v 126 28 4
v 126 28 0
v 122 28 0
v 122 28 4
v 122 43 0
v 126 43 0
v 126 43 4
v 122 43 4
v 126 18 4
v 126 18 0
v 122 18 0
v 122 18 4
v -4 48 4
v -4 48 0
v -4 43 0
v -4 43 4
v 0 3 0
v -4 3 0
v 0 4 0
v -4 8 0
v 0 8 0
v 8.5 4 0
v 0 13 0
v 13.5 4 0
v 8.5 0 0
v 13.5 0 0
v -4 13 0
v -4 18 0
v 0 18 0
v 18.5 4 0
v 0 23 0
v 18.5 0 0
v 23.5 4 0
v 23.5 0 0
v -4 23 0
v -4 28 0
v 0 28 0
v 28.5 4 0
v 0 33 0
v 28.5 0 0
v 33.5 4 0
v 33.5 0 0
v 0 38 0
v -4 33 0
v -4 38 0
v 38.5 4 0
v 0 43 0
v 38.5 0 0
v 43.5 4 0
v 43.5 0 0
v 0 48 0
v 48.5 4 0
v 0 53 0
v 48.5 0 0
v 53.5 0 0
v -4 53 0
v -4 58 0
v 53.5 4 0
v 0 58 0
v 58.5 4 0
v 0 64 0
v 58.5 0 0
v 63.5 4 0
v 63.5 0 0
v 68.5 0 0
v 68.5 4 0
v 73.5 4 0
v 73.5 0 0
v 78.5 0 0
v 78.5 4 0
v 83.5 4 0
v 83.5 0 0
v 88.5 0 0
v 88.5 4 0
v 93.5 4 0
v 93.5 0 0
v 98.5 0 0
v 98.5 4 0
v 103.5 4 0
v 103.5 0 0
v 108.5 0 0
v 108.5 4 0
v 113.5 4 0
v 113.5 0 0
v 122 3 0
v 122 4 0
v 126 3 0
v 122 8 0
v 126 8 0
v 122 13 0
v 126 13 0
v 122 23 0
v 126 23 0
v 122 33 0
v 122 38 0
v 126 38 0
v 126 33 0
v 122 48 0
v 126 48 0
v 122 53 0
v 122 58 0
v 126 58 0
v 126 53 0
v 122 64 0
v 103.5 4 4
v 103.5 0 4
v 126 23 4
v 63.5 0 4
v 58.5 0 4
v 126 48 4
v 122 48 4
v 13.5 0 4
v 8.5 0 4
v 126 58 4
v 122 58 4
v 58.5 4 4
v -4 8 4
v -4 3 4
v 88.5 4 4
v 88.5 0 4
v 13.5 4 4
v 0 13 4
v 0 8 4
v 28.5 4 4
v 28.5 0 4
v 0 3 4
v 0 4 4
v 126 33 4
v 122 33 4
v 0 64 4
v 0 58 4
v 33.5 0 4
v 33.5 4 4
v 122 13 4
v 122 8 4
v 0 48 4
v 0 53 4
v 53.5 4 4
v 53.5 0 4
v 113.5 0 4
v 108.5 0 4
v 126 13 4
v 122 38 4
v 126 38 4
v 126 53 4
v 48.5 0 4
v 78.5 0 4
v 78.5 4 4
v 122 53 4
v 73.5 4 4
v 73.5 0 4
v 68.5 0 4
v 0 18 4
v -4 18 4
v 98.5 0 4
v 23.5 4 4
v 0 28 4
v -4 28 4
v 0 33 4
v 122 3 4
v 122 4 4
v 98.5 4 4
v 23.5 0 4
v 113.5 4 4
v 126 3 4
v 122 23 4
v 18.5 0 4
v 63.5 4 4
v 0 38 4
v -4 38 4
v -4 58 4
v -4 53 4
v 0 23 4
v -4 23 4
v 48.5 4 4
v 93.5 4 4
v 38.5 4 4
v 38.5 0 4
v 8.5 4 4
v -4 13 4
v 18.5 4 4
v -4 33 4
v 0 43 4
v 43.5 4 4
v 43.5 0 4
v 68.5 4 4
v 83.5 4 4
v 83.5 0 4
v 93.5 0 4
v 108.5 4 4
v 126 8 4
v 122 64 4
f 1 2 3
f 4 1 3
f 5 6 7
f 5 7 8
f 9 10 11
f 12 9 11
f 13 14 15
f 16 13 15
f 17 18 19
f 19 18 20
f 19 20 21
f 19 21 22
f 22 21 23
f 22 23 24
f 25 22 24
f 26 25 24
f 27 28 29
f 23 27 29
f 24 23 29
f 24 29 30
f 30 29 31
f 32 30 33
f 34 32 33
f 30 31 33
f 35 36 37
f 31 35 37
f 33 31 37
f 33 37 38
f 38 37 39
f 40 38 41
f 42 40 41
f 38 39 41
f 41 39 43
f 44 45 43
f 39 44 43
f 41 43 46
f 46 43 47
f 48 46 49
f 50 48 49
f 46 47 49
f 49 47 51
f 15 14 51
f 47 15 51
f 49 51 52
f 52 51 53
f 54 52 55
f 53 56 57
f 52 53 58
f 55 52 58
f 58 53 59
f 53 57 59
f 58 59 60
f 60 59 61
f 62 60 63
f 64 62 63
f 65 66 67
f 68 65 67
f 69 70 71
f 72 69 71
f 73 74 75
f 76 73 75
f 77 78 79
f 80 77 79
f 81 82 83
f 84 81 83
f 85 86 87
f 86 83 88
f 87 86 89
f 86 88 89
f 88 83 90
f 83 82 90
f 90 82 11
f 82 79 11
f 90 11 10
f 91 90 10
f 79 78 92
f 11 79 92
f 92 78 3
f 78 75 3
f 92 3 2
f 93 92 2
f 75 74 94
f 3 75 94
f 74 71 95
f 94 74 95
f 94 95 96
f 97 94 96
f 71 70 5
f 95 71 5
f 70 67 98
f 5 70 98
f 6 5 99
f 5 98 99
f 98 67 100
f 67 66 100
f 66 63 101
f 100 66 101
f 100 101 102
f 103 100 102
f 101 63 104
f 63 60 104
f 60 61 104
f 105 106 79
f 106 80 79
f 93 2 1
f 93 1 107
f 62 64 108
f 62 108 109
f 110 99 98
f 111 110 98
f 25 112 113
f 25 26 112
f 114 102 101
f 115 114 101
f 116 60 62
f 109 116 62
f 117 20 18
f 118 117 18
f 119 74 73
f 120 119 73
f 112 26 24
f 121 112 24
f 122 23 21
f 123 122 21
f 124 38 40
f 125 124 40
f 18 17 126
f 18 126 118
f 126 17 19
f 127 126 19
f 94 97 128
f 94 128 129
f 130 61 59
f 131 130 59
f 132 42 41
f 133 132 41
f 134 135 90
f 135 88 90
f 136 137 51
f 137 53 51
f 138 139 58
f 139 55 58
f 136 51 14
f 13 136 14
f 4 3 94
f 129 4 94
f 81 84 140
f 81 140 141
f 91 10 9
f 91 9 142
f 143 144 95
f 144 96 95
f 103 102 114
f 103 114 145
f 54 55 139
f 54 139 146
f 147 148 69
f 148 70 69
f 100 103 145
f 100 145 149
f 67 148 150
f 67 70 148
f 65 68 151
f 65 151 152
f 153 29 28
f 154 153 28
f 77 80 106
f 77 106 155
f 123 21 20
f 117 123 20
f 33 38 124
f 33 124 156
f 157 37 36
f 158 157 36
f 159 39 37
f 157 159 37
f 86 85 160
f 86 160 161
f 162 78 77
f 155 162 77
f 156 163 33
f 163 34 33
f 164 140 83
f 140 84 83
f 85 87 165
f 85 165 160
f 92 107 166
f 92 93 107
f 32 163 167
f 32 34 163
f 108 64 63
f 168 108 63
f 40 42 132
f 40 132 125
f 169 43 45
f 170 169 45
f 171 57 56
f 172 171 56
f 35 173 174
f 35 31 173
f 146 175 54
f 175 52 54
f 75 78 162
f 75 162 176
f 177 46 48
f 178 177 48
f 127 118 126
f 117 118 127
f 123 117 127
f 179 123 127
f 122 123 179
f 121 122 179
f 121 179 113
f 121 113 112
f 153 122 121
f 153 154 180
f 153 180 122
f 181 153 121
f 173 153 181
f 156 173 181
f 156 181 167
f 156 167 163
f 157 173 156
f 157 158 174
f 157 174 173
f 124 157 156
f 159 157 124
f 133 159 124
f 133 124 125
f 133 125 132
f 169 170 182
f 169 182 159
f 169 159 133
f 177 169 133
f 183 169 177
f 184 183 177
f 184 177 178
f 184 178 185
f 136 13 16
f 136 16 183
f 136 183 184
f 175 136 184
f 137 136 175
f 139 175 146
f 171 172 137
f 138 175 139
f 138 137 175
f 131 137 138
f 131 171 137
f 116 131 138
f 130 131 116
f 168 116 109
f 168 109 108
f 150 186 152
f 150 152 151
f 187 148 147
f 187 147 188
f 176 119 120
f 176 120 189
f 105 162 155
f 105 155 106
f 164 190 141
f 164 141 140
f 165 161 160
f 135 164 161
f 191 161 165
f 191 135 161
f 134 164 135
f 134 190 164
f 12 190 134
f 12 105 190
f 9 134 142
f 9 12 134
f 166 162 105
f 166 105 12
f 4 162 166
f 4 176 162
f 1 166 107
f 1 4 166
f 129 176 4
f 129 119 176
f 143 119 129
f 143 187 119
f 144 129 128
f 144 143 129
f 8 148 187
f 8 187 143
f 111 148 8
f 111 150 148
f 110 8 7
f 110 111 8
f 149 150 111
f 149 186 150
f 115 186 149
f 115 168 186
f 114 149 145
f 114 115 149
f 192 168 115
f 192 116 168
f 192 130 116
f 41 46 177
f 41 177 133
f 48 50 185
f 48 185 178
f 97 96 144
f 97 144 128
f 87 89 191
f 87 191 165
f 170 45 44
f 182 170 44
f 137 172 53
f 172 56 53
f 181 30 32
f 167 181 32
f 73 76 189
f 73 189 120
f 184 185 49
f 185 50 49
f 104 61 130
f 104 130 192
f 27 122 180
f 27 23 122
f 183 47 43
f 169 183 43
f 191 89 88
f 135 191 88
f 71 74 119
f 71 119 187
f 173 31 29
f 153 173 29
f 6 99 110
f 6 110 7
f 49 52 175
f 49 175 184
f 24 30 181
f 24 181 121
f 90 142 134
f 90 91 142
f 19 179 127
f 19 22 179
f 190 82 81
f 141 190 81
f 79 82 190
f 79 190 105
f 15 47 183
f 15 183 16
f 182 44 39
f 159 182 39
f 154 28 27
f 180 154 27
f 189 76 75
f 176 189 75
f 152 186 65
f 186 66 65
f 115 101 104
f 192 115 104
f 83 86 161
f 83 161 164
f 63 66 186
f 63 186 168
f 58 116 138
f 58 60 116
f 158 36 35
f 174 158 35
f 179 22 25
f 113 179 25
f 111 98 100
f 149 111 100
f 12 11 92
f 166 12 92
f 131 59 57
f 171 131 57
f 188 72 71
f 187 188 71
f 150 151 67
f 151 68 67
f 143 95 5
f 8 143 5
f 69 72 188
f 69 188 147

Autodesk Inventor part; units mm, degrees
ref_plane "YZ Plane" through (0, 0, 0) normal (1, 0, 0) x (0, 1, 0)
ref_plane "XZ Plane" through (0, 0, 0) normal (0, 1, 0) x (-1, 0, 0)
ref_plane "XY Plane" through (0, 0, 0) normal (0, 0, 1) x (1, 0, 0)
sketch "Sketch1" plane through (0, 0, 0) normal (0, 0, 1) x (1, 0, 0)
  line L0 (0, 3) -> (-4, 3)
  line L1 (0, 0) -> (0, 4)
  line L2 (8.5, 4) -> (0, 4)
  line L3 (8.5, 4) -> (8.5, 0)
  line L4 (13.5, 0) -> (8.5, 0)
  line L5 (13.5, 0) -> (13.5, 4)
  line L6 (18.5, 4) -> (13.5, 4)
  line L7 (18.5, 4) -> (18.5, 0)
  line L8 (23.5, 0) -> (18.5, 0)
  line L9 (23.5, 0) -> (23.5, 4)
  line L10 (28.5, 4) -> (23.5, 4)
  line L11 (28.5, 4) -> (28.5, 0)
  line L12 (33.5, 0) -> (28.5, 0)
  line L13 (33.5, 0) -> (33.5, 4)
  line L14 (38.5, 4) -> (33.5, 4)
  line L15 (38.5, 4) -> (38.5, 0)
  line L16 (43.5, 0) -> (38.5, 0)
  line L17 (43.5, 0) -> (43.5, 4)
  line L18 (48.5, 4) -> (43.5, 4)
  line L19 (48.5, 4) -> (48.5, 0)
  line L20 (53.5, 0) -> (48.5, 0)
  line L21 (53.5, 0) -> (53.5, 4)
  line L22 (58.5, 4) -> (53.5, 4)
  line L23 (58.5, 4) -> (58.5, 0)
  line L24 (63.5, 0) -> (58.5, 0)
  line L25 (63.5, 0) -> (63.5, 4)
  line L26 (68.5, 4) -> (63.5, 4)
  line L27 (68.5, 4) -> (68.5, 0)
  line L28 (73.5, 0) -> (68.5, 0)
  line L29 (73.5, 0) -> (73.5, 4)
  line L30 (78.5, 4) -> (73.5, 4)
  line L31 (83.5, 0) -> (78.5, 0)
  line L32 (78.5, 4) -> (78.5, 0)
  line L33 (83.5, 0) -> (83.5, 4)
  line L34 (88.5, 4) -> (83.5, 4)
  line L35 (88.5, 4) -> (88.5, 0)
  line L36 (93.5, 0) -> (88.5, 0)
  line L37 (93.5, 0) -> (93.5, 4)
  line L38 (98.5, 4) -> (93.5, 4)
  line L39 (98.5, 4) -> (98.5, 0)
  line L40 (103.5, 0) -> (98.5, 0)
  line L41 (103.5, 0) -> (103.5, 4)
  line L42 (108.5, 4) -> (103.5, 4)
  line L43 (108.5, 4) -> (108.5, 0)
  line L44 (113.5, 0) -> (108.5, 0)
  line L45 (113.5, 0) -> (113.5, 4)
  line L46 (122, 4) -> (113.5, 4)
  line L47 (126, 3) -> (122, 3)
  line L48 (122, 0) -> (122, 4)
  line L49 (126, 8) -> (126, 3)
  line L50 (126, 8) -> (122, 8)
  line L51 (122, 8) -> (122, 13)
  line L52 (126, 13) -> (122, 13)
  line L53 (126, 18) -> (126, 13)
  line L54 (126, 18) -> (122, 18)
  line L55 (122, 18) -> (122, 23)
  line L56 (126, 23) -> (122, 23)
  line L57 (126, 28) -> (126, 23)
  line L58 (126, 28) -> (122, 28)
  line L59 (122, 28) -> (122, 33)
  line L60 (126, 33) -> (122, 33)
  line L61 (126, 38) -> (126, 33)
  line L62 (126, 38) -> (122, 38)
  line L63 (122, 38) -> (122, 43)
  line L64 (126, 43) -> (122, 43)
  line L65 (126, 48) -> (126, 43)
  line L66 (126, 48) -> (122, 48)
  line L67 (122, 48) -> (122, 53)
  line L68 (126, 53) -> (122, 53)
  line L69 (126, 58) -> (126, 53)
  line L70 (126, 58) -> (122, 58)
  line L71 (122, 58) -> (122, 68)
  line L72 (-4, 8) -> (-4, 3)
  line L73 (0, 8) -> (-4, 8)
  line L74 (0, 13) -> (0, 8)
  line L75 (0, 13) -> (-4, 13)
  line L76 (-4, 18) -> (-4, 13)
  line L77 (0, 18) -> (-4, 18)
  line L78 (0, 23) -> (0, 18)
  line L79 (0, 23) -> (-4, 23)
  line L80 (-4, 28) -> (-4, 23)
  line L81 (0, 28) -> (-4, 28)
  line L82 (0, 33) -> (0, 28)
  line L83 (-4, 33) -> (0, 33)
  line L84 (-4, 38) -> (-4, 33)
  line L85 (0, 38) -> (-4, 38)
  line L86 (0, 43) -> (0, 38)
  line L87 (0, 43) -> (-4, 43)
  line L88 (-4, 48) -> (-4, 43)
  line L89 (0, 48) -> (-4, 48)
  line L90 (0, 53) -> (0, 48)
  line L91 (-4, 53) -> (0, 53)
  line L92 (-4, 58) -> (-4, 53)
  line L93 (0, 58) -> (-4, 58)
  line L94 (0, 68) -> (0, 58)
  line L95 (0, 64) -> (122, 64)
  point P0 (0, 0)
extrude "Extrusion1" add sketch "Sketch1" along normal blind 4
sketch "Sketch2" plane through (0, 0, 0) normal (0, 0, -1) x (-1, 0, 0)
  line L0 (-8.5, 4) -> (-8.5, 0) projected
  line L1 (0, 4) -> (-8.5, 4) projected
  line L2 (0, 3) -> (0, 4) projected
  line L3 (4, 3) -> (0, 3) projected
  line L4 (4, 8) -> (4, 3) projected
  line L5 (0, 8) -> (4, 8) projected
  line L6 (0, 13) -> (0, 8) projected
  line L7 (4, 13) -> (0, 13) projected
  line L8 (4, 18) -> (4, 13) projected
  line L9 (0, 18) -> (4, 18) projected
  line L10 (0, 23) -> (0, 18) projected
  line L11 (4, 23) -> (0, 23) projected
  line L12 (4, 28) -> (4, 23) projected
  line L13 (0, 28) -> (4, 28) projected
  line L14 (0, 33) -> (0, 28) projected
  line L15 (4, 33) -> (0, 33) projected
  line L16 (4, 38) -> (4, 33) projected
  line L17 (0, 38) -> (4, 38) projected
  line L18 (0, 43) -> (0, 38) projected
  line L19 (4, 43) -> (0, 43) projected
  line L20 (4, 48) -> (4, 43) projected
  line L21 (0, 48) -> (4, 48) projected
  line L22 (0, 53) -> (0, 48) projected
  line L23 (4, 53) -> (0, 53) projected
  line L24 (4, 58) -> (4, 53) projected
  line L25 (0, 58) -> (4, 58) projected
  line L26 (0, 64) -> (0, 58) projected
  line L27 (-122, 64) -> (0, 64) projected
  line L28 (-122, 58) -> (-122, 64) projected
  line L29 (-126, 58) -> (-122, 58) projected
  line L30 (-126, 53) -> (-126, 58) projected
  line L31 (-122, 53) -> (-126, 53) projected
  line L32 (-122, 48) -> (-122, 53) projected
  line L33 (-126, 48) -> (-122, 48) projected
  line L34 (-126, 43) -> (-126, 48) projected
  line L35 (-122, 43) -> (-126, 43) projected
  line L36 (-122, 38) -> (-122, 43) projected
  line L37 (-126, 38) -> (-122, 38) projected
  line L38 (-126, 33) -> (-126, 38) projected
  line L39 (-122, 33) -> (-126, 33) projected
  line L40 (-122, 28) -> (-122, 33) projected
  line L41 (-126, 28) -> (-122, 28) projected
  line L42 (-126, 23) -> (-126, 28) projected
  line L43 (-122, 23) -> (-126, 23) projected
  line L44 (-122, 18) -> (-122, 23) projected
  line L45 (-126, 18) -> (-122, 18) projected
  line L46 (-126, 13) -> (-126, 18) projected
  line L47 (-122, 13) -> (-126, 13) projected
  line L48 (-122, 8) -> (-122, 13) projected
  line L49 (-126, 8) -> (-122, 8) projected
  line L50 (-126, 3) -> (-126, 8) projected
  line L51 (-122, 3) -> (-126, 3) projected
  line L52 (-122, 4) -> (-122, 3) projected
  line L53 (-113.5, 4) -> (-122, 4) projected
  line L54 (-113.5, 0) -> (-113.5, 4) projected
  line L55 (-108.5, 0) -> (-113.5, 0) projected
  line L56 (-108.5, 4) -> (-108.5, 0) projected
  line L57 (-103.5, 4) -> (-108.5, 4) projected
  line L58 (-103.5, 0) -> (-103.5, 4) projected
  line L59 (-98.5, 0) -> (-103.5, 0) projected
  line L60 (-98.5, 4) -> (-98.5, 0) projected
  line L61 (-93.5, 4) -> (-98.5, 4) projected
  line L62 (-93.5, 0) -> (-93.5, 4) projected
  line L63 (-88.5, 0) -> (-93.5, 0) projected
  line L64 (-88.5, 4) -> (-88.5, 0) projected
  line L65 (-83.5, 4) -> (-88.5, 4) projected
  line L66 (-83.5, 0) -> (-83.5, 4) projected
  line L67 (-78.5, 0) -> (-83.5, 0) projected
  line L68 (-78.5, 4) -> (-78.5, 0) projected
  line L69 (-73.5, 4) -> (-78.5, 4) projected
  line L70 (-73.5, 0) -> (-73.5, 4) projected
  line L71 (-68.5, 0) -> (-73.5, 0) projected
  line L72 (-68.5, 4) -> (-68.5, 0) projected
  line L73 (-63.5, 4) -> (-68.5, 4) projected
  line L74 (-63.5, 0) -> (-63.5, 4) projected
  line L75 (-58.5, 0) -> (-63.5, 0) projected
  line L76 (-58.5, 4) -> (-58.5, 0) projected
  line L77 (-53.5, 4) -> (-58.5, 4) projected
  line L78 (-53.5, 0) -> (-53.5, 4) projected
  line L79 (-48.5, 0) -> (-53.5, 0) projected
  line L80 (-48.5, 4) -> (-48.5, 0) projected
  line L81 (-43.5, 4) -> (-48.5, 4) projected
  line L82 (-43.5, 0) -> (-43.5, 4) projected
  line L83 (-38.5, 0) -> (-43.5, 0) projected
  line L84 (-38.5, 4) -> (-38.5, 0) projected
  line L85 (-33.5, 4) -> (-38.5, 4) projected
  line L86 (-33.5, 0) -> (-33.5, 4) projected
  line L87 (-28.5, 0) -> (-33.5, 0) projected
  line L88 (-28.5, 4) -> (-28.5, 0) projected
  line L89 (-23.5, 4) -> (-28.5, 4) projected
  line L90 (-23.5, 0) -> (-23.5, 4) projected
  line L91 (-18.5, 0) -> (-23.5, 0) projected
  line L92 (-18.5, 4) -> (-18.5, 0) projected
  line L93 (-13.5, 4) -> (-18.5, 4) projected
  line L94 (-13.5, 0) -> (-13.5, 4) projected
  line L95 (-8.5, 0) -> (-13.5, 0) projected
  point P0 (0, 0)
properties part number "BackWand"
